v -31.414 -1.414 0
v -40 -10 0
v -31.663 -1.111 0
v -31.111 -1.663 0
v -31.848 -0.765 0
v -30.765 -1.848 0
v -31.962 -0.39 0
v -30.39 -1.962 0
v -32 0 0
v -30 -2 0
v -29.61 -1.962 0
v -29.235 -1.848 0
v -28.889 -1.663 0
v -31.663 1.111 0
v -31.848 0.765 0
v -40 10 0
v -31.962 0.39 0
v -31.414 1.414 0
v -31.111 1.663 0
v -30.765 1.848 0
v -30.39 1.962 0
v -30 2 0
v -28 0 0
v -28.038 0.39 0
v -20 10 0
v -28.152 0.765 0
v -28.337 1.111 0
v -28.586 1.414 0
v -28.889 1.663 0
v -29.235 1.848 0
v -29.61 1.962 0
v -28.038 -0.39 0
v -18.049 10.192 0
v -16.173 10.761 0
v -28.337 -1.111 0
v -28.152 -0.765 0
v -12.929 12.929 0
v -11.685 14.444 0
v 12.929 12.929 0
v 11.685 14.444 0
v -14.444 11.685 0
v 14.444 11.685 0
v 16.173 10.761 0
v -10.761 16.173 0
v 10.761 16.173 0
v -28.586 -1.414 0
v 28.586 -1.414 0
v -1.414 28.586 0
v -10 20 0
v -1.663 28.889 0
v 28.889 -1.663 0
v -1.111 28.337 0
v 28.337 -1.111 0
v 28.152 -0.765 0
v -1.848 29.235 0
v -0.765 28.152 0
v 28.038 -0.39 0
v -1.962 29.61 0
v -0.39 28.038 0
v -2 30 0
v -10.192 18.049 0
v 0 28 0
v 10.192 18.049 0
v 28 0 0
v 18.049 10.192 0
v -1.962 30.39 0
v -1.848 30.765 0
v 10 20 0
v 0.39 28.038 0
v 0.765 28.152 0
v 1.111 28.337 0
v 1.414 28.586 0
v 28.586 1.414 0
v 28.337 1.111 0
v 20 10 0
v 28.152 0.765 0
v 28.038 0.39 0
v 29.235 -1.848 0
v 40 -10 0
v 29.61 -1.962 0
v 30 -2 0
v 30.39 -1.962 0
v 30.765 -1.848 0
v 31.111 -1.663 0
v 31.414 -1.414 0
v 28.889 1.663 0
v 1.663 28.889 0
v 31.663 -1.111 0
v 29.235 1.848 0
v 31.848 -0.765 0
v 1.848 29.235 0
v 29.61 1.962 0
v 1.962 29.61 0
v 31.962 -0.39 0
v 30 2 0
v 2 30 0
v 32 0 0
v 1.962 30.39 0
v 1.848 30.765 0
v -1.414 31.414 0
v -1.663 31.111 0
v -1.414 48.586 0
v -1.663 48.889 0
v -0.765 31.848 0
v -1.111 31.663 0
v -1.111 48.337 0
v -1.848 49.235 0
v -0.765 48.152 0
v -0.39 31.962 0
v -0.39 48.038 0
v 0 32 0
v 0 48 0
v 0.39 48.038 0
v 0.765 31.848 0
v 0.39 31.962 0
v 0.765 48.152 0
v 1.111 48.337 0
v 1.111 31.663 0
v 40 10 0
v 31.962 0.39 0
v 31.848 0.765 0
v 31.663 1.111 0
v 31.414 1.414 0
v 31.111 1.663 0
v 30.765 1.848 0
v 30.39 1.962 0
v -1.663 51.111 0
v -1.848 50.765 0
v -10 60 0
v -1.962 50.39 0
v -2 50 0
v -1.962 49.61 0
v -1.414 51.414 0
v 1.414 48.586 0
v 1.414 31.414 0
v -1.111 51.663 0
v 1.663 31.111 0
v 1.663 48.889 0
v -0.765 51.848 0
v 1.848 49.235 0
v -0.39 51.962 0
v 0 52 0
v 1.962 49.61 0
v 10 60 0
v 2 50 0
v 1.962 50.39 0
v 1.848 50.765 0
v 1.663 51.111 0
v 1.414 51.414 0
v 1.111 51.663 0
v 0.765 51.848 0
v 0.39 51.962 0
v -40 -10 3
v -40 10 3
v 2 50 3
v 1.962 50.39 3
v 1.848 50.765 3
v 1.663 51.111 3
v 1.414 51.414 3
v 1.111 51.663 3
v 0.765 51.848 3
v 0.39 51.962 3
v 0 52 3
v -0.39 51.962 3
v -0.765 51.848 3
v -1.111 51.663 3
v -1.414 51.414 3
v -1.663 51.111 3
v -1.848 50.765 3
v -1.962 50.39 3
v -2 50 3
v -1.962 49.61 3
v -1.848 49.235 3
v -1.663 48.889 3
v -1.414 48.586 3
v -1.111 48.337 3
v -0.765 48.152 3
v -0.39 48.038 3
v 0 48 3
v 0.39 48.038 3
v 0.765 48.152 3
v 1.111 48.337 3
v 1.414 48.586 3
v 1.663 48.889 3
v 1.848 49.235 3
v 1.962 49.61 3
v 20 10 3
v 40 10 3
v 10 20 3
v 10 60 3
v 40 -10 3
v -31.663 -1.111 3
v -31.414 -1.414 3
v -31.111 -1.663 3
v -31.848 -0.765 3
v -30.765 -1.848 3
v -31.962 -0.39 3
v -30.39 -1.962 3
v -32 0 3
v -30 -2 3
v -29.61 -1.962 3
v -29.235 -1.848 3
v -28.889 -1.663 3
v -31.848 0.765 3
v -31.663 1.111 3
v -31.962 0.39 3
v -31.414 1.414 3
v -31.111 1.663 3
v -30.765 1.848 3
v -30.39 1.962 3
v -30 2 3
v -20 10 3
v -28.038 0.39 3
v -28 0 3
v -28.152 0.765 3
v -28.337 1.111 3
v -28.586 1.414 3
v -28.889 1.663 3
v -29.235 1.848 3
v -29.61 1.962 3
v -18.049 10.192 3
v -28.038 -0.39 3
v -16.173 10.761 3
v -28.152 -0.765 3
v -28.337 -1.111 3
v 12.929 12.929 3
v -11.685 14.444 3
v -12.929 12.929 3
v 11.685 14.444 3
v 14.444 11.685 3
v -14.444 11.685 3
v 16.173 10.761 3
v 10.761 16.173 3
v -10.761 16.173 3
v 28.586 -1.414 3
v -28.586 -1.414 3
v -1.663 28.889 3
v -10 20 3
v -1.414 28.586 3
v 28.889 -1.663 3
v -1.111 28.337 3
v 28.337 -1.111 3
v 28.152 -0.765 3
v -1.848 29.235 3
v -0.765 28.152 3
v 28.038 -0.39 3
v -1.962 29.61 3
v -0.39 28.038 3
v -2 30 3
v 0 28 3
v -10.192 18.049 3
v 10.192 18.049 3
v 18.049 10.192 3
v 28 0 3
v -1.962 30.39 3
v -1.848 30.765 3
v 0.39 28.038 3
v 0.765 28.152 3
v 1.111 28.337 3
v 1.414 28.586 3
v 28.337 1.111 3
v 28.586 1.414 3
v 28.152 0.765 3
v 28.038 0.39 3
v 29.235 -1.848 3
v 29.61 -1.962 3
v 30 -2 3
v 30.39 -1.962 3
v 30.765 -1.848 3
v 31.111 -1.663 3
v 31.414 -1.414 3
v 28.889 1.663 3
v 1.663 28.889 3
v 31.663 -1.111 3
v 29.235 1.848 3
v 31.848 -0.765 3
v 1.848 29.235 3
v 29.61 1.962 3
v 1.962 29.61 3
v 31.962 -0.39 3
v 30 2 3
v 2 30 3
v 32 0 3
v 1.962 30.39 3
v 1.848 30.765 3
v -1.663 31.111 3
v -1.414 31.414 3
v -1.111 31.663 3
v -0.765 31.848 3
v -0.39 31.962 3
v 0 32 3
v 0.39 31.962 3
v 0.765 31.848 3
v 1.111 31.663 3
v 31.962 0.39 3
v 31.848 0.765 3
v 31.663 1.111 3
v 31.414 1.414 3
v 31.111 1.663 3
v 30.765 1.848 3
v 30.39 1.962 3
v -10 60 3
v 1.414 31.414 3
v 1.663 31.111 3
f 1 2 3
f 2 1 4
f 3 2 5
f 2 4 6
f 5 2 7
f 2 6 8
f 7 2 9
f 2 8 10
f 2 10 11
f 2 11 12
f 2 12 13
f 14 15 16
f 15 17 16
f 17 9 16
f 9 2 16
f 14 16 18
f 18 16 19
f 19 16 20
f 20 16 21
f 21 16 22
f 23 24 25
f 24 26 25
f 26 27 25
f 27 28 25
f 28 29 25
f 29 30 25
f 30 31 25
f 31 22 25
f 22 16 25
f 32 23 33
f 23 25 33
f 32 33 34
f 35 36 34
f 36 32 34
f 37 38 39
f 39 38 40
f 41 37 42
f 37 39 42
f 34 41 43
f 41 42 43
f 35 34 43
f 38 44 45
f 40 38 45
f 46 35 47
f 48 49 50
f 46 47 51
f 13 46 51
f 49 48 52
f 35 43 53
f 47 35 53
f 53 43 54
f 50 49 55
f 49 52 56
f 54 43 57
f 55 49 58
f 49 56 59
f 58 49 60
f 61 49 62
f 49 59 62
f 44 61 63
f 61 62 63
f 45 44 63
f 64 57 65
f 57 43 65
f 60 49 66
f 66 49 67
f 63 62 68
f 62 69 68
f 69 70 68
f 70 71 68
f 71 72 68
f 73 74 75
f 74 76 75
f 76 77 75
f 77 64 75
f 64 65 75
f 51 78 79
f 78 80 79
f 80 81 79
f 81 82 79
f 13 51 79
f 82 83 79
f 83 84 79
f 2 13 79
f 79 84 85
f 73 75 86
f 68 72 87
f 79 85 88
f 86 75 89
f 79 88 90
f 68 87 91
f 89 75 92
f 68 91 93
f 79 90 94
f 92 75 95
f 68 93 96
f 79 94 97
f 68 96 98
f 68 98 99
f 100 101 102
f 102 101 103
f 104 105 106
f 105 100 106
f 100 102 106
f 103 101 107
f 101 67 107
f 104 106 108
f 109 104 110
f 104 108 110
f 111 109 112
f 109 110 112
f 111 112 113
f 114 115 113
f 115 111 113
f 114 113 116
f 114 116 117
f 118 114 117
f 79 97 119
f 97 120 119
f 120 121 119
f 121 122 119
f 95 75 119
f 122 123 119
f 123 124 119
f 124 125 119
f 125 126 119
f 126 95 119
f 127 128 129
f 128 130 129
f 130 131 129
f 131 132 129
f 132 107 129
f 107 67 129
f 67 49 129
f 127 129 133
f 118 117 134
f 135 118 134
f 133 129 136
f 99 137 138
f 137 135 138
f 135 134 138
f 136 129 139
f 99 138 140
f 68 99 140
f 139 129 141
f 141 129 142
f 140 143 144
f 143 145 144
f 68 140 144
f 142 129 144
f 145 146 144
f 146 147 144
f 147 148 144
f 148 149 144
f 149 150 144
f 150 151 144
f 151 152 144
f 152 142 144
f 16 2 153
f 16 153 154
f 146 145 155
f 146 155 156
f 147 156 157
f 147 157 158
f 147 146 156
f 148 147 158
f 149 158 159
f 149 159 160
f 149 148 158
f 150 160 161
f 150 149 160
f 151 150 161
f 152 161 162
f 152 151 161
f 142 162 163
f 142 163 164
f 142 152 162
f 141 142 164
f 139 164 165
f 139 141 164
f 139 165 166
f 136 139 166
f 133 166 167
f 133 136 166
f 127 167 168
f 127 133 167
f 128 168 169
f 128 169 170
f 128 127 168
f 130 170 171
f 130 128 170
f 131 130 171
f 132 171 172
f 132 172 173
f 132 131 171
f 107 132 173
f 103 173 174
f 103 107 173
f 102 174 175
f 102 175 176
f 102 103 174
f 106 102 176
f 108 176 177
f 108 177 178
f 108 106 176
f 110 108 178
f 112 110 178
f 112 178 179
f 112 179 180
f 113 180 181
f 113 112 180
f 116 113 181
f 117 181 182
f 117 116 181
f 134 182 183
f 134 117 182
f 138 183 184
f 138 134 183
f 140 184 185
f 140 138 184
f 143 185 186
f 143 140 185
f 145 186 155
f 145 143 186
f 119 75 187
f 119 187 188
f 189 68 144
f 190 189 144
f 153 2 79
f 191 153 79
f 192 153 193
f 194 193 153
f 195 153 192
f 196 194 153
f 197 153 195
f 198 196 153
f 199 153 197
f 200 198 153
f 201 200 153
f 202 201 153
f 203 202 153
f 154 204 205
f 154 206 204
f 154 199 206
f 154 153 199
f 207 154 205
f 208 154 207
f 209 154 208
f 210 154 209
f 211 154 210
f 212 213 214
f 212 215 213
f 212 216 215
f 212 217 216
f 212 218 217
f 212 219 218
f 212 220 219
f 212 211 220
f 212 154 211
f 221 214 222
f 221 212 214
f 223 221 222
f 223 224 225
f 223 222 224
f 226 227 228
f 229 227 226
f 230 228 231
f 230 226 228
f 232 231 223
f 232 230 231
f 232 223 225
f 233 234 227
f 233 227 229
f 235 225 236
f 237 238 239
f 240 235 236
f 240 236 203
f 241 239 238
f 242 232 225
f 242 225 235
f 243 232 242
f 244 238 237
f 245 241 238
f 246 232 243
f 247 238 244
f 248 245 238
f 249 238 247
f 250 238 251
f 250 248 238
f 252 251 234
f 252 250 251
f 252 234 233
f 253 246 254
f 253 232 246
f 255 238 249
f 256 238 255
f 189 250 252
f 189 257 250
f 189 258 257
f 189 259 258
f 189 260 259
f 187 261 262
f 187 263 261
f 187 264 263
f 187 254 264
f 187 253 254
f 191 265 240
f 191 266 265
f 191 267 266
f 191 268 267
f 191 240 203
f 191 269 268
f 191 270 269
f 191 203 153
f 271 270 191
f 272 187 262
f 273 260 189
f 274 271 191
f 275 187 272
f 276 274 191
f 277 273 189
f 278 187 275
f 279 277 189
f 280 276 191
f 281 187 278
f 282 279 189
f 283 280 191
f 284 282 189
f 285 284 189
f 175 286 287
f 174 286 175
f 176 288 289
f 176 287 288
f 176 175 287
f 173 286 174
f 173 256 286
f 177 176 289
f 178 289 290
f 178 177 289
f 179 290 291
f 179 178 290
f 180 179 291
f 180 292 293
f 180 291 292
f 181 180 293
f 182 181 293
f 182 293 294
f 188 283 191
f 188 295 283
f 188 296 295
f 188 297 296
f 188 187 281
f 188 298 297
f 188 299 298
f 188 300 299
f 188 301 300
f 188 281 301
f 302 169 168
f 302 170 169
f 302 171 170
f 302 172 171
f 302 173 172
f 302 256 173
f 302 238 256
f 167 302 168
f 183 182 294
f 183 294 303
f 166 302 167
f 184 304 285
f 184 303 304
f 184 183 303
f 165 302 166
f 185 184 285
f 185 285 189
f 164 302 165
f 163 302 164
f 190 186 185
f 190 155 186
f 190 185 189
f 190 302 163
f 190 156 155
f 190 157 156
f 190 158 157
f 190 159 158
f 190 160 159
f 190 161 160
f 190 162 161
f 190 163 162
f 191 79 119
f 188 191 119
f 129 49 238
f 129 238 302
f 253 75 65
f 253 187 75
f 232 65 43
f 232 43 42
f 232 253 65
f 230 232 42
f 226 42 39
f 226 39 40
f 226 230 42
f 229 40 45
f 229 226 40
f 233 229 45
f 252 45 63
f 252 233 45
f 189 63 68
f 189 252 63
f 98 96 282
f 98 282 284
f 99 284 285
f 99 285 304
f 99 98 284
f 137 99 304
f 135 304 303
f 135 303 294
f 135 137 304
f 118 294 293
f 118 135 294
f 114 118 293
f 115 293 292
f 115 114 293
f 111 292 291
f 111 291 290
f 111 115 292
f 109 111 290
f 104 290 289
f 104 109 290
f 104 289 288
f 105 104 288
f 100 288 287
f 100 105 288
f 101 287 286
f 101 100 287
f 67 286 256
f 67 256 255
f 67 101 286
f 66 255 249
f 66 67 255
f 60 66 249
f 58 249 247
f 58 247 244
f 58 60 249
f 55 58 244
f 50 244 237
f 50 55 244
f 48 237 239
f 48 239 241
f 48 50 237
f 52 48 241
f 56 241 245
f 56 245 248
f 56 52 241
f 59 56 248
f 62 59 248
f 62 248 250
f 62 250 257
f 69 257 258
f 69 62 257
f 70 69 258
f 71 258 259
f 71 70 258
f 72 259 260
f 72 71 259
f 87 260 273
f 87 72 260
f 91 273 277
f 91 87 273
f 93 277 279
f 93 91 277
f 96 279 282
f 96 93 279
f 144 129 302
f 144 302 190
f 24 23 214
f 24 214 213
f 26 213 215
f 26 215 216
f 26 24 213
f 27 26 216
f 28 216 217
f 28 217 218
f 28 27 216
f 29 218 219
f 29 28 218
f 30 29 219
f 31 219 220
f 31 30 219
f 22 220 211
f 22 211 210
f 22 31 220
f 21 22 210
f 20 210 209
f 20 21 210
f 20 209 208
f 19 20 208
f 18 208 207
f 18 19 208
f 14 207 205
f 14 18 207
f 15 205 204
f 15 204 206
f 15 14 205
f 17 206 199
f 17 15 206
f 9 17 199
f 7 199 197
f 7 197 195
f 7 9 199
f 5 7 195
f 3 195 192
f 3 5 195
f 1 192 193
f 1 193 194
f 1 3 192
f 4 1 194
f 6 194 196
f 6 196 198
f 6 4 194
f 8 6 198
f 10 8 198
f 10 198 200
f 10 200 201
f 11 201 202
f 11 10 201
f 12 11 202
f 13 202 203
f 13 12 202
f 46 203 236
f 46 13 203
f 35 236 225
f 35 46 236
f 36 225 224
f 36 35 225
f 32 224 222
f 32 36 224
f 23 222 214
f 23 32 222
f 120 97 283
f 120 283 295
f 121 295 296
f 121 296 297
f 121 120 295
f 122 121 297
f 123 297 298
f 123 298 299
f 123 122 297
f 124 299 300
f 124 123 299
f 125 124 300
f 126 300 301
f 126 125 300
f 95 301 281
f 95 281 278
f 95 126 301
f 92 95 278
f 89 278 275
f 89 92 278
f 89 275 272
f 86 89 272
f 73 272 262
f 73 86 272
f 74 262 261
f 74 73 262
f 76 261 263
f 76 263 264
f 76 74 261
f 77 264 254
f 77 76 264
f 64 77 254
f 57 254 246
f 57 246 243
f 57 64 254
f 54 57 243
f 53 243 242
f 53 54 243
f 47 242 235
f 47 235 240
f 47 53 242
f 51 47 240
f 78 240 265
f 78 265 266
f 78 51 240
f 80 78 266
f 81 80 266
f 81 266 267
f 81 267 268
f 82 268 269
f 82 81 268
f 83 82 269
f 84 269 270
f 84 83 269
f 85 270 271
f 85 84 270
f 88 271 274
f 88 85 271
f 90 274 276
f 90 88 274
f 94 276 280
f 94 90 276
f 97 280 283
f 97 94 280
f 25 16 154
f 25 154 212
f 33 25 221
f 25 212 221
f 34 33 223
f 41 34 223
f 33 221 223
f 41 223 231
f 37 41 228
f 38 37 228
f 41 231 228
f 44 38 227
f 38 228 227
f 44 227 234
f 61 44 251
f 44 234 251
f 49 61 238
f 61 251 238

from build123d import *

# Parameters (mm, degrees)
SKETCH_1_W      = 20
SKETCH_1_H      = 50
SKETCH_1_R      = 2
SKETCH_1_W_2    = 80
SKETCH_1_H_2    = 20
EXTRUDE_1_DEPTH = 3
FILLET_1_R      = 10


with BuildPart() as part:
    # 草图1 → 凸台-拉伸1 (new body)
    # profile 1 of 2: a face of its own
    with BuildSketch(Plane.XY):
        with Locations((0, 35)):
            Rectangle(SKETCH_1_W, SKETCH_1_H)
        with Locations((0, 30)):
            Circle(SKETCH_1_R, mode=Mode.SUBTRACT)
        with Locations((0, 50)):
            Circle(SKETCH_1_R, mode=Mode.SUBTRACT)
    # profile 2 of 2: a face of its own
    with BuildSketch(Plane.XY):
        Rectangle(SKETCH_1_W_2, SKETCH_1_H_2)
        with Locations((30, 0)):
            Circle(SKETCH_1_R, mode=Mode.SUBTRACT)
        with Locations((-30, 0)):
            Circle(SKETCH_1_R, mode=Mode.SUBTRACT)
    extrude(amount=EXTRUDE_1_DEPTH)

    # 圆角1
    fillet_1_edges = [part.edges().sort_by_distance(p)[0] for p in [
        (10, 10, 1.5),
        (-10, 10, 1.5),
    ]]
    fillet(fillet_1_edges, radius=FILLET_1_R)


solid = part.part
